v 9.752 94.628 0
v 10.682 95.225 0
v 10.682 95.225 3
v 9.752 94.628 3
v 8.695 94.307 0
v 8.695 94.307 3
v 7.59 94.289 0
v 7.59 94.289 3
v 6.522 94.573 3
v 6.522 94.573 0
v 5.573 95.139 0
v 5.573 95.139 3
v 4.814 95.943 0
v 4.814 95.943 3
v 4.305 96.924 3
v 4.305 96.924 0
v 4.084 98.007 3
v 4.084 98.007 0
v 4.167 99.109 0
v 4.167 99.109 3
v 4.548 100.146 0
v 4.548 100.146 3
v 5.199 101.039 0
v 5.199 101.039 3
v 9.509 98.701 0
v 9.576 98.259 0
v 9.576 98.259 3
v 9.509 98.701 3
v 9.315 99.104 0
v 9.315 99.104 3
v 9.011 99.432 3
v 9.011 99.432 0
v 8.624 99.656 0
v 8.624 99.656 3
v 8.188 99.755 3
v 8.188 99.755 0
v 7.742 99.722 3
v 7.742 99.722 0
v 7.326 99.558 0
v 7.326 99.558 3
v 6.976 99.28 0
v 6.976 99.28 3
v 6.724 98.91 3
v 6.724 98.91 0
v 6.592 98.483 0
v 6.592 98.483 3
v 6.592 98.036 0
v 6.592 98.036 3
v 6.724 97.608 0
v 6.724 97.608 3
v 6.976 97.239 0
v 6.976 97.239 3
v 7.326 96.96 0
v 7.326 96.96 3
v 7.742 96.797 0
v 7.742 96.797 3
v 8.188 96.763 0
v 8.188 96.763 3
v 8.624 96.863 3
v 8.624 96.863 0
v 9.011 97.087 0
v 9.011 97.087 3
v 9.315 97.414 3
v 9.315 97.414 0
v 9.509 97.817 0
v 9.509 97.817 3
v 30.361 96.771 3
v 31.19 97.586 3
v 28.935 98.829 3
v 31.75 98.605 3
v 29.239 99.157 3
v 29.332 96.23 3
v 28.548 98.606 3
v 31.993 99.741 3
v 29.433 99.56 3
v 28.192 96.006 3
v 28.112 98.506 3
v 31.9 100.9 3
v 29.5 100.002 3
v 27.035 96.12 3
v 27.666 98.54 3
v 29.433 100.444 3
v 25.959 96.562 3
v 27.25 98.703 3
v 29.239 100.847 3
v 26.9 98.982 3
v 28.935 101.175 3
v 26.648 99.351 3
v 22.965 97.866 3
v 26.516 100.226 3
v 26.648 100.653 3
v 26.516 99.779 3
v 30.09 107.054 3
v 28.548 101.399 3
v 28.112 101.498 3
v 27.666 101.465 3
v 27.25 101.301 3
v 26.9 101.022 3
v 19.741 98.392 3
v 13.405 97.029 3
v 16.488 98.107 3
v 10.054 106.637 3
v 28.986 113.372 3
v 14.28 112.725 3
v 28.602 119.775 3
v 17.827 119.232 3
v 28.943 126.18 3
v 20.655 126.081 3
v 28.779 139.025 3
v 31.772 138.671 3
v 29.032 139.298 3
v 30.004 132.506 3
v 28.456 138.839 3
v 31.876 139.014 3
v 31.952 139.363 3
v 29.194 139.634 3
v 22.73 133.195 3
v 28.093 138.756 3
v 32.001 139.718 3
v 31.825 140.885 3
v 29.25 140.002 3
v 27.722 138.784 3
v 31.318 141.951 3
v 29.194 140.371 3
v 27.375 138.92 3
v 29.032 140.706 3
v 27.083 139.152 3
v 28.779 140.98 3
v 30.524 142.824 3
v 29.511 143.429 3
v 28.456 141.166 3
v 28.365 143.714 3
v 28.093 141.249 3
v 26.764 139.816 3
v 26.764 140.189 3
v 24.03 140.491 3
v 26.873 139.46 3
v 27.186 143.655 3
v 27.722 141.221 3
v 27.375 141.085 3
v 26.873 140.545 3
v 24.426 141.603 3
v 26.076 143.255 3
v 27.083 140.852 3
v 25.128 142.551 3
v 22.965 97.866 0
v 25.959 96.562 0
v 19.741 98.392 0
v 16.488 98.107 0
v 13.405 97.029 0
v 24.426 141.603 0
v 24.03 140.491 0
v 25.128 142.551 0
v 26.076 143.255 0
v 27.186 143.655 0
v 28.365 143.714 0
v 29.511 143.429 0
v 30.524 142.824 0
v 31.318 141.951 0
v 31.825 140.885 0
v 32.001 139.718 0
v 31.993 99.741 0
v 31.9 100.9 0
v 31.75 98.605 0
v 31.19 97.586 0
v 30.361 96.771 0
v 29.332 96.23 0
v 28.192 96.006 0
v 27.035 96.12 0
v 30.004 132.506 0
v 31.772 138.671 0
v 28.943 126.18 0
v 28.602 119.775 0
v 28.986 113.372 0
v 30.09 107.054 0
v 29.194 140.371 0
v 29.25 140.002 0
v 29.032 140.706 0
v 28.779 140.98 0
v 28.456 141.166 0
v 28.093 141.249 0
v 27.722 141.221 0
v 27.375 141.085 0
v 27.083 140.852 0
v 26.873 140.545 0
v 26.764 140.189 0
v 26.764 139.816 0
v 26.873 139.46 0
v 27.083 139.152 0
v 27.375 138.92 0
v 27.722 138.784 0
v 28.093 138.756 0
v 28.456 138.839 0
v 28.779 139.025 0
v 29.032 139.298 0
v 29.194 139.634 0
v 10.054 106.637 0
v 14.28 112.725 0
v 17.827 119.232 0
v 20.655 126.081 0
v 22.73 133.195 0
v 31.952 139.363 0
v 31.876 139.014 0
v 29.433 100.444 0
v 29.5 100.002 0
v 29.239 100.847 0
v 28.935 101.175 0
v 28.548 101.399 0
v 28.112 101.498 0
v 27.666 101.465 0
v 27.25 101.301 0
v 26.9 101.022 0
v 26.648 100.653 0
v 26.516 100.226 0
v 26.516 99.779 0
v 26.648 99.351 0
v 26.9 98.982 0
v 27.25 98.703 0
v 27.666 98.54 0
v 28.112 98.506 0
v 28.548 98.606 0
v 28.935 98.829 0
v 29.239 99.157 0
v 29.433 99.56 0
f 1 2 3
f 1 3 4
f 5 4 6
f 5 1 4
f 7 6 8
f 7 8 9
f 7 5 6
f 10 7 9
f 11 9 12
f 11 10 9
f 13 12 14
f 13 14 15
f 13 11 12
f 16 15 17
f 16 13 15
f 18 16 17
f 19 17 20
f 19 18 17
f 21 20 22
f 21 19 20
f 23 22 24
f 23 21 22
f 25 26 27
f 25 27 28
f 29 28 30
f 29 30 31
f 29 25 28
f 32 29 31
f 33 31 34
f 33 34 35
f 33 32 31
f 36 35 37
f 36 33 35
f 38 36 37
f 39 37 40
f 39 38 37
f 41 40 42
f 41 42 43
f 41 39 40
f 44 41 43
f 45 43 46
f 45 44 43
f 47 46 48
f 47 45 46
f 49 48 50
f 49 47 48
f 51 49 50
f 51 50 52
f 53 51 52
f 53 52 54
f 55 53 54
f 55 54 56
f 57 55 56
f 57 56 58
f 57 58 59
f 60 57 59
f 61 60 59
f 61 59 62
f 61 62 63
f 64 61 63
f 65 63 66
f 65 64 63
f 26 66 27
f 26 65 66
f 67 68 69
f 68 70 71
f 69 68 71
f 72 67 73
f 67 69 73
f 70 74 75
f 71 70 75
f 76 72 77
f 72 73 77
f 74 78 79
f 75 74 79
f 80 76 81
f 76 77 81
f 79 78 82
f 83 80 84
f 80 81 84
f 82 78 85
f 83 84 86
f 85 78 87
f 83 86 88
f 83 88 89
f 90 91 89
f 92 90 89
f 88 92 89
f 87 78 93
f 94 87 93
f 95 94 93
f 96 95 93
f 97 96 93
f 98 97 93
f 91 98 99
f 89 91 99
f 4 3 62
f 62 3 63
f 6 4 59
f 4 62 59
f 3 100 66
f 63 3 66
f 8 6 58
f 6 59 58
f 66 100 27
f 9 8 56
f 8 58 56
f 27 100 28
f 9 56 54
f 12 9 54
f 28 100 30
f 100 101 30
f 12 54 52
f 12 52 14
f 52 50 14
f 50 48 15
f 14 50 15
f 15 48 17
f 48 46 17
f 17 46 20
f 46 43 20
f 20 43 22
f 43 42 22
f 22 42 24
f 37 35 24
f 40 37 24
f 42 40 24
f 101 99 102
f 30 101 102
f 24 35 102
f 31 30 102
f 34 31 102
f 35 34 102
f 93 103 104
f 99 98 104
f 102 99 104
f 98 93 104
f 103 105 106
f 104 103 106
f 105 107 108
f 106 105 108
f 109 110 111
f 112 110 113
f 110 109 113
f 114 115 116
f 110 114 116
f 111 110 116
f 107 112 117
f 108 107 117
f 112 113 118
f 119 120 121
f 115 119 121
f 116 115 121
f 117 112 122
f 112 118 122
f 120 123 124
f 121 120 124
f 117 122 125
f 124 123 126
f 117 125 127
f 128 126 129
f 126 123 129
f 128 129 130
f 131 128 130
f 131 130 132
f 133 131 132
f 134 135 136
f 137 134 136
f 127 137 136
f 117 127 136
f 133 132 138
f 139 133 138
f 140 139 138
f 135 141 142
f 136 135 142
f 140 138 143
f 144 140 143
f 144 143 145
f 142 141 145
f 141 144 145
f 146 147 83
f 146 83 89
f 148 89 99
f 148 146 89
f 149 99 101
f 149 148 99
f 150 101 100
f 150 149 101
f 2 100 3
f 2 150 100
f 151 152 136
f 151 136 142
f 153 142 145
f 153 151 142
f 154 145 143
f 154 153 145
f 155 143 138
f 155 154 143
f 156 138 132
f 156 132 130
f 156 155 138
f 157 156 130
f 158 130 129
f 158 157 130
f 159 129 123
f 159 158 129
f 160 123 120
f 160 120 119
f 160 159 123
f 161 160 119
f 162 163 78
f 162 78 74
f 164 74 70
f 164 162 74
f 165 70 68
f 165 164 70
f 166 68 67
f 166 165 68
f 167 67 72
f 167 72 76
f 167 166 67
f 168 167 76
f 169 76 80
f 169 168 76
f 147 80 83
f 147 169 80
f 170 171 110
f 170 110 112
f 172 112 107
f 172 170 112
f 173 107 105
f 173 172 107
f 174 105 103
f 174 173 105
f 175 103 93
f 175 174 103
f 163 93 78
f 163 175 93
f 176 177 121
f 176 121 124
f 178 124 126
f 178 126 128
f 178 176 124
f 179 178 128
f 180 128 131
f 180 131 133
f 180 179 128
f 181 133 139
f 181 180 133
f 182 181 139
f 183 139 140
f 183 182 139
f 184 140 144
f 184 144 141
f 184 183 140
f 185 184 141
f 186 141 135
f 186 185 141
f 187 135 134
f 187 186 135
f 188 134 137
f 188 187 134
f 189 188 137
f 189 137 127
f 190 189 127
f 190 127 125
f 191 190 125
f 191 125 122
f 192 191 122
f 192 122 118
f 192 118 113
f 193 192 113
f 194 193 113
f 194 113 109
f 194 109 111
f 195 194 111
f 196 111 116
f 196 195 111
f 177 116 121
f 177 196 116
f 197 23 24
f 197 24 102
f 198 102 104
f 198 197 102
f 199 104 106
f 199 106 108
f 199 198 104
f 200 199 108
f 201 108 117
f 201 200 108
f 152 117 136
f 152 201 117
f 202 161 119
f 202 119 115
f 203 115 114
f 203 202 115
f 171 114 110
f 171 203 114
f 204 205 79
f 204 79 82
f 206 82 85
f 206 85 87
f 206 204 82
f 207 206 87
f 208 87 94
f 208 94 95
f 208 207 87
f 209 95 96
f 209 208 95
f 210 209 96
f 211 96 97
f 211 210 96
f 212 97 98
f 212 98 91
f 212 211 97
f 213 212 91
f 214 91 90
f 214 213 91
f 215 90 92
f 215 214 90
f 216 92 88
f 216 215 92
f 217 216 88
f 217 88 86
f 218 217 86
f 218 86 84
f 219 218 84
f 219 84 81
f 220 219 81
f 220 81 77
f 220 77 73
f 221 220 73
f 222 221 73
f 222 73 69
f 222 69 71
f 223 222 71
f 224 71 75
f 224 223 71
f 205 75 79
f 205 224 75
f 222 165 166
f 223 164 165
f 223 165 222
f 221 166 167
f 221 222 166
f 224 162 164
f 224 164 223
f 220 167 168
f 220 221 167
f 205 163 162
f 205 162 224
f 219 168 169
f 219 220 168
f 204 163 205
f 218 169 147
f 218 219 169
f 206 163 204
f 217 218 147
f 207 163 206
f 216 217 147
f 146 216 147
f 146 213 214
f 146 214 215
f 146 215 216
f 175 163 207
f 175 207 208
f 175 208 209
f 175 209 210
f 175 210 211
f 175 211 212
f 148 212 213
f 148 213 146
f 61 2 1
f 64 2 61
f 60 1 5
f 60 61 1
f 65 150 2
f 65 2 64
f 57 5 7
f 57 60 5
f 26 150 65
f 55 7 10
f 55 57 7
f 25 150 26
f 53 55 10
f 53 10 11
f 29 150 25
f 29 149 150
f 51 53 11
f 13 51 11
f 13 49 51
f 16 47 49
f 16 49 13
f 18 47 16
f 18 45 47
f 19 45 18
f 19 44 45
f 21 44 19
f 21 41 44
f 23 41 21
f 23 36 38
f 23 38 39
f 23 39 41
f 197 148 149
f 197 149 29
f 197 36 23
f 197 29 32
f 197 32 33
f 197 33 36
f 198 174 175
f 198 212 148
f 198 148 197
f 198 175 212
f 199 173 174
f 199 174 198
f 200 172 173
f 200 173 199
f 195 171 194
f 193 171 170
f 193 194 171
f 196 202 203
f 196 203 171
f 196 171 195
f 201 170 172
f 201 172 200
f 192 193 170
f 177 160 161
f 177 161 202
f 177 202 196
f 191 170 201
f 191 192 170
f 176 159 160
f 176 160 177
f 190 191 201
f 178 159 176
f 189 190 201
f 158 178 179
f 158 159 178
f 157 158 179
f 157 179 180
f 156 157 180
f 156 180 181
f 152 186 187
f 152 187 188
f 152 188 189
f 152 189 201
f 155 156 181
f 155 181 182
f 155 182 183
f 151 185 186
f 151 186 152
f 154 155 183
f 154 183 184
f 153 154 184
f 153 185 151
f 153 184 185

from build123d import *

# Parameters (mm, degrees)
SKETCH_2_R      = 1.25
SKETCH_2_R_2    = 1.5
EXTRUDE_1_DEPTH = 3


with BuildPart() as part:
    # 草圖2 → 填料-伸長1 (new body)
    with BuildSketch(Plane.XY):
        with BuildLine():
            ThreePointArc((31.771756119, 138.671302862), (28.601861286, 119.774671061), (31.9, 100.9))
            ThreePointArc((31.9, 100.9), (30.360629041, 96.771462466), (25.959440964, 96.561632457))
            ThreePointArc((25.959440964, 96.561632457), (18.105782324, 98.350587579), (10.682096943, 95.22501406))
            ThreePointArc((10.682096943, 95.22501406), (5.16557517, 95.514842117), (5.199291514, 101.038869269))
            ThreePointArc((5.199291514, 101.038869269), (17.826888938, 119.231579997), (24.029658233, 140.490850759))
            ThreePointArc((24.029658233, 140.490850759), (28.365250917, 143.714078762), (32.00050872, 139.717647432))
            ThreePointArc((32.00050872, 139.717647432), (31.917708673, 139.187571923), (31.771756119, 138.671302862))
        make_face()
        with Locations((27.99967116, 140.002243515)):
            Circle(SKETCH_2_R, mode=Mode.SUBTRACT)
        with Locations((8.075611168, 98.259296802)):
            Circle(SKETCH_2_R_2, mode=Mode.SUBTRACT)
        with Locations((27.999548416, 100.002200002)):
            Circle(SKETCH_2_R_2, mode=Mode.SUBTRACT)
    extrude(amount=EXTRUDE_1_DEPTH)


solid = part.part
